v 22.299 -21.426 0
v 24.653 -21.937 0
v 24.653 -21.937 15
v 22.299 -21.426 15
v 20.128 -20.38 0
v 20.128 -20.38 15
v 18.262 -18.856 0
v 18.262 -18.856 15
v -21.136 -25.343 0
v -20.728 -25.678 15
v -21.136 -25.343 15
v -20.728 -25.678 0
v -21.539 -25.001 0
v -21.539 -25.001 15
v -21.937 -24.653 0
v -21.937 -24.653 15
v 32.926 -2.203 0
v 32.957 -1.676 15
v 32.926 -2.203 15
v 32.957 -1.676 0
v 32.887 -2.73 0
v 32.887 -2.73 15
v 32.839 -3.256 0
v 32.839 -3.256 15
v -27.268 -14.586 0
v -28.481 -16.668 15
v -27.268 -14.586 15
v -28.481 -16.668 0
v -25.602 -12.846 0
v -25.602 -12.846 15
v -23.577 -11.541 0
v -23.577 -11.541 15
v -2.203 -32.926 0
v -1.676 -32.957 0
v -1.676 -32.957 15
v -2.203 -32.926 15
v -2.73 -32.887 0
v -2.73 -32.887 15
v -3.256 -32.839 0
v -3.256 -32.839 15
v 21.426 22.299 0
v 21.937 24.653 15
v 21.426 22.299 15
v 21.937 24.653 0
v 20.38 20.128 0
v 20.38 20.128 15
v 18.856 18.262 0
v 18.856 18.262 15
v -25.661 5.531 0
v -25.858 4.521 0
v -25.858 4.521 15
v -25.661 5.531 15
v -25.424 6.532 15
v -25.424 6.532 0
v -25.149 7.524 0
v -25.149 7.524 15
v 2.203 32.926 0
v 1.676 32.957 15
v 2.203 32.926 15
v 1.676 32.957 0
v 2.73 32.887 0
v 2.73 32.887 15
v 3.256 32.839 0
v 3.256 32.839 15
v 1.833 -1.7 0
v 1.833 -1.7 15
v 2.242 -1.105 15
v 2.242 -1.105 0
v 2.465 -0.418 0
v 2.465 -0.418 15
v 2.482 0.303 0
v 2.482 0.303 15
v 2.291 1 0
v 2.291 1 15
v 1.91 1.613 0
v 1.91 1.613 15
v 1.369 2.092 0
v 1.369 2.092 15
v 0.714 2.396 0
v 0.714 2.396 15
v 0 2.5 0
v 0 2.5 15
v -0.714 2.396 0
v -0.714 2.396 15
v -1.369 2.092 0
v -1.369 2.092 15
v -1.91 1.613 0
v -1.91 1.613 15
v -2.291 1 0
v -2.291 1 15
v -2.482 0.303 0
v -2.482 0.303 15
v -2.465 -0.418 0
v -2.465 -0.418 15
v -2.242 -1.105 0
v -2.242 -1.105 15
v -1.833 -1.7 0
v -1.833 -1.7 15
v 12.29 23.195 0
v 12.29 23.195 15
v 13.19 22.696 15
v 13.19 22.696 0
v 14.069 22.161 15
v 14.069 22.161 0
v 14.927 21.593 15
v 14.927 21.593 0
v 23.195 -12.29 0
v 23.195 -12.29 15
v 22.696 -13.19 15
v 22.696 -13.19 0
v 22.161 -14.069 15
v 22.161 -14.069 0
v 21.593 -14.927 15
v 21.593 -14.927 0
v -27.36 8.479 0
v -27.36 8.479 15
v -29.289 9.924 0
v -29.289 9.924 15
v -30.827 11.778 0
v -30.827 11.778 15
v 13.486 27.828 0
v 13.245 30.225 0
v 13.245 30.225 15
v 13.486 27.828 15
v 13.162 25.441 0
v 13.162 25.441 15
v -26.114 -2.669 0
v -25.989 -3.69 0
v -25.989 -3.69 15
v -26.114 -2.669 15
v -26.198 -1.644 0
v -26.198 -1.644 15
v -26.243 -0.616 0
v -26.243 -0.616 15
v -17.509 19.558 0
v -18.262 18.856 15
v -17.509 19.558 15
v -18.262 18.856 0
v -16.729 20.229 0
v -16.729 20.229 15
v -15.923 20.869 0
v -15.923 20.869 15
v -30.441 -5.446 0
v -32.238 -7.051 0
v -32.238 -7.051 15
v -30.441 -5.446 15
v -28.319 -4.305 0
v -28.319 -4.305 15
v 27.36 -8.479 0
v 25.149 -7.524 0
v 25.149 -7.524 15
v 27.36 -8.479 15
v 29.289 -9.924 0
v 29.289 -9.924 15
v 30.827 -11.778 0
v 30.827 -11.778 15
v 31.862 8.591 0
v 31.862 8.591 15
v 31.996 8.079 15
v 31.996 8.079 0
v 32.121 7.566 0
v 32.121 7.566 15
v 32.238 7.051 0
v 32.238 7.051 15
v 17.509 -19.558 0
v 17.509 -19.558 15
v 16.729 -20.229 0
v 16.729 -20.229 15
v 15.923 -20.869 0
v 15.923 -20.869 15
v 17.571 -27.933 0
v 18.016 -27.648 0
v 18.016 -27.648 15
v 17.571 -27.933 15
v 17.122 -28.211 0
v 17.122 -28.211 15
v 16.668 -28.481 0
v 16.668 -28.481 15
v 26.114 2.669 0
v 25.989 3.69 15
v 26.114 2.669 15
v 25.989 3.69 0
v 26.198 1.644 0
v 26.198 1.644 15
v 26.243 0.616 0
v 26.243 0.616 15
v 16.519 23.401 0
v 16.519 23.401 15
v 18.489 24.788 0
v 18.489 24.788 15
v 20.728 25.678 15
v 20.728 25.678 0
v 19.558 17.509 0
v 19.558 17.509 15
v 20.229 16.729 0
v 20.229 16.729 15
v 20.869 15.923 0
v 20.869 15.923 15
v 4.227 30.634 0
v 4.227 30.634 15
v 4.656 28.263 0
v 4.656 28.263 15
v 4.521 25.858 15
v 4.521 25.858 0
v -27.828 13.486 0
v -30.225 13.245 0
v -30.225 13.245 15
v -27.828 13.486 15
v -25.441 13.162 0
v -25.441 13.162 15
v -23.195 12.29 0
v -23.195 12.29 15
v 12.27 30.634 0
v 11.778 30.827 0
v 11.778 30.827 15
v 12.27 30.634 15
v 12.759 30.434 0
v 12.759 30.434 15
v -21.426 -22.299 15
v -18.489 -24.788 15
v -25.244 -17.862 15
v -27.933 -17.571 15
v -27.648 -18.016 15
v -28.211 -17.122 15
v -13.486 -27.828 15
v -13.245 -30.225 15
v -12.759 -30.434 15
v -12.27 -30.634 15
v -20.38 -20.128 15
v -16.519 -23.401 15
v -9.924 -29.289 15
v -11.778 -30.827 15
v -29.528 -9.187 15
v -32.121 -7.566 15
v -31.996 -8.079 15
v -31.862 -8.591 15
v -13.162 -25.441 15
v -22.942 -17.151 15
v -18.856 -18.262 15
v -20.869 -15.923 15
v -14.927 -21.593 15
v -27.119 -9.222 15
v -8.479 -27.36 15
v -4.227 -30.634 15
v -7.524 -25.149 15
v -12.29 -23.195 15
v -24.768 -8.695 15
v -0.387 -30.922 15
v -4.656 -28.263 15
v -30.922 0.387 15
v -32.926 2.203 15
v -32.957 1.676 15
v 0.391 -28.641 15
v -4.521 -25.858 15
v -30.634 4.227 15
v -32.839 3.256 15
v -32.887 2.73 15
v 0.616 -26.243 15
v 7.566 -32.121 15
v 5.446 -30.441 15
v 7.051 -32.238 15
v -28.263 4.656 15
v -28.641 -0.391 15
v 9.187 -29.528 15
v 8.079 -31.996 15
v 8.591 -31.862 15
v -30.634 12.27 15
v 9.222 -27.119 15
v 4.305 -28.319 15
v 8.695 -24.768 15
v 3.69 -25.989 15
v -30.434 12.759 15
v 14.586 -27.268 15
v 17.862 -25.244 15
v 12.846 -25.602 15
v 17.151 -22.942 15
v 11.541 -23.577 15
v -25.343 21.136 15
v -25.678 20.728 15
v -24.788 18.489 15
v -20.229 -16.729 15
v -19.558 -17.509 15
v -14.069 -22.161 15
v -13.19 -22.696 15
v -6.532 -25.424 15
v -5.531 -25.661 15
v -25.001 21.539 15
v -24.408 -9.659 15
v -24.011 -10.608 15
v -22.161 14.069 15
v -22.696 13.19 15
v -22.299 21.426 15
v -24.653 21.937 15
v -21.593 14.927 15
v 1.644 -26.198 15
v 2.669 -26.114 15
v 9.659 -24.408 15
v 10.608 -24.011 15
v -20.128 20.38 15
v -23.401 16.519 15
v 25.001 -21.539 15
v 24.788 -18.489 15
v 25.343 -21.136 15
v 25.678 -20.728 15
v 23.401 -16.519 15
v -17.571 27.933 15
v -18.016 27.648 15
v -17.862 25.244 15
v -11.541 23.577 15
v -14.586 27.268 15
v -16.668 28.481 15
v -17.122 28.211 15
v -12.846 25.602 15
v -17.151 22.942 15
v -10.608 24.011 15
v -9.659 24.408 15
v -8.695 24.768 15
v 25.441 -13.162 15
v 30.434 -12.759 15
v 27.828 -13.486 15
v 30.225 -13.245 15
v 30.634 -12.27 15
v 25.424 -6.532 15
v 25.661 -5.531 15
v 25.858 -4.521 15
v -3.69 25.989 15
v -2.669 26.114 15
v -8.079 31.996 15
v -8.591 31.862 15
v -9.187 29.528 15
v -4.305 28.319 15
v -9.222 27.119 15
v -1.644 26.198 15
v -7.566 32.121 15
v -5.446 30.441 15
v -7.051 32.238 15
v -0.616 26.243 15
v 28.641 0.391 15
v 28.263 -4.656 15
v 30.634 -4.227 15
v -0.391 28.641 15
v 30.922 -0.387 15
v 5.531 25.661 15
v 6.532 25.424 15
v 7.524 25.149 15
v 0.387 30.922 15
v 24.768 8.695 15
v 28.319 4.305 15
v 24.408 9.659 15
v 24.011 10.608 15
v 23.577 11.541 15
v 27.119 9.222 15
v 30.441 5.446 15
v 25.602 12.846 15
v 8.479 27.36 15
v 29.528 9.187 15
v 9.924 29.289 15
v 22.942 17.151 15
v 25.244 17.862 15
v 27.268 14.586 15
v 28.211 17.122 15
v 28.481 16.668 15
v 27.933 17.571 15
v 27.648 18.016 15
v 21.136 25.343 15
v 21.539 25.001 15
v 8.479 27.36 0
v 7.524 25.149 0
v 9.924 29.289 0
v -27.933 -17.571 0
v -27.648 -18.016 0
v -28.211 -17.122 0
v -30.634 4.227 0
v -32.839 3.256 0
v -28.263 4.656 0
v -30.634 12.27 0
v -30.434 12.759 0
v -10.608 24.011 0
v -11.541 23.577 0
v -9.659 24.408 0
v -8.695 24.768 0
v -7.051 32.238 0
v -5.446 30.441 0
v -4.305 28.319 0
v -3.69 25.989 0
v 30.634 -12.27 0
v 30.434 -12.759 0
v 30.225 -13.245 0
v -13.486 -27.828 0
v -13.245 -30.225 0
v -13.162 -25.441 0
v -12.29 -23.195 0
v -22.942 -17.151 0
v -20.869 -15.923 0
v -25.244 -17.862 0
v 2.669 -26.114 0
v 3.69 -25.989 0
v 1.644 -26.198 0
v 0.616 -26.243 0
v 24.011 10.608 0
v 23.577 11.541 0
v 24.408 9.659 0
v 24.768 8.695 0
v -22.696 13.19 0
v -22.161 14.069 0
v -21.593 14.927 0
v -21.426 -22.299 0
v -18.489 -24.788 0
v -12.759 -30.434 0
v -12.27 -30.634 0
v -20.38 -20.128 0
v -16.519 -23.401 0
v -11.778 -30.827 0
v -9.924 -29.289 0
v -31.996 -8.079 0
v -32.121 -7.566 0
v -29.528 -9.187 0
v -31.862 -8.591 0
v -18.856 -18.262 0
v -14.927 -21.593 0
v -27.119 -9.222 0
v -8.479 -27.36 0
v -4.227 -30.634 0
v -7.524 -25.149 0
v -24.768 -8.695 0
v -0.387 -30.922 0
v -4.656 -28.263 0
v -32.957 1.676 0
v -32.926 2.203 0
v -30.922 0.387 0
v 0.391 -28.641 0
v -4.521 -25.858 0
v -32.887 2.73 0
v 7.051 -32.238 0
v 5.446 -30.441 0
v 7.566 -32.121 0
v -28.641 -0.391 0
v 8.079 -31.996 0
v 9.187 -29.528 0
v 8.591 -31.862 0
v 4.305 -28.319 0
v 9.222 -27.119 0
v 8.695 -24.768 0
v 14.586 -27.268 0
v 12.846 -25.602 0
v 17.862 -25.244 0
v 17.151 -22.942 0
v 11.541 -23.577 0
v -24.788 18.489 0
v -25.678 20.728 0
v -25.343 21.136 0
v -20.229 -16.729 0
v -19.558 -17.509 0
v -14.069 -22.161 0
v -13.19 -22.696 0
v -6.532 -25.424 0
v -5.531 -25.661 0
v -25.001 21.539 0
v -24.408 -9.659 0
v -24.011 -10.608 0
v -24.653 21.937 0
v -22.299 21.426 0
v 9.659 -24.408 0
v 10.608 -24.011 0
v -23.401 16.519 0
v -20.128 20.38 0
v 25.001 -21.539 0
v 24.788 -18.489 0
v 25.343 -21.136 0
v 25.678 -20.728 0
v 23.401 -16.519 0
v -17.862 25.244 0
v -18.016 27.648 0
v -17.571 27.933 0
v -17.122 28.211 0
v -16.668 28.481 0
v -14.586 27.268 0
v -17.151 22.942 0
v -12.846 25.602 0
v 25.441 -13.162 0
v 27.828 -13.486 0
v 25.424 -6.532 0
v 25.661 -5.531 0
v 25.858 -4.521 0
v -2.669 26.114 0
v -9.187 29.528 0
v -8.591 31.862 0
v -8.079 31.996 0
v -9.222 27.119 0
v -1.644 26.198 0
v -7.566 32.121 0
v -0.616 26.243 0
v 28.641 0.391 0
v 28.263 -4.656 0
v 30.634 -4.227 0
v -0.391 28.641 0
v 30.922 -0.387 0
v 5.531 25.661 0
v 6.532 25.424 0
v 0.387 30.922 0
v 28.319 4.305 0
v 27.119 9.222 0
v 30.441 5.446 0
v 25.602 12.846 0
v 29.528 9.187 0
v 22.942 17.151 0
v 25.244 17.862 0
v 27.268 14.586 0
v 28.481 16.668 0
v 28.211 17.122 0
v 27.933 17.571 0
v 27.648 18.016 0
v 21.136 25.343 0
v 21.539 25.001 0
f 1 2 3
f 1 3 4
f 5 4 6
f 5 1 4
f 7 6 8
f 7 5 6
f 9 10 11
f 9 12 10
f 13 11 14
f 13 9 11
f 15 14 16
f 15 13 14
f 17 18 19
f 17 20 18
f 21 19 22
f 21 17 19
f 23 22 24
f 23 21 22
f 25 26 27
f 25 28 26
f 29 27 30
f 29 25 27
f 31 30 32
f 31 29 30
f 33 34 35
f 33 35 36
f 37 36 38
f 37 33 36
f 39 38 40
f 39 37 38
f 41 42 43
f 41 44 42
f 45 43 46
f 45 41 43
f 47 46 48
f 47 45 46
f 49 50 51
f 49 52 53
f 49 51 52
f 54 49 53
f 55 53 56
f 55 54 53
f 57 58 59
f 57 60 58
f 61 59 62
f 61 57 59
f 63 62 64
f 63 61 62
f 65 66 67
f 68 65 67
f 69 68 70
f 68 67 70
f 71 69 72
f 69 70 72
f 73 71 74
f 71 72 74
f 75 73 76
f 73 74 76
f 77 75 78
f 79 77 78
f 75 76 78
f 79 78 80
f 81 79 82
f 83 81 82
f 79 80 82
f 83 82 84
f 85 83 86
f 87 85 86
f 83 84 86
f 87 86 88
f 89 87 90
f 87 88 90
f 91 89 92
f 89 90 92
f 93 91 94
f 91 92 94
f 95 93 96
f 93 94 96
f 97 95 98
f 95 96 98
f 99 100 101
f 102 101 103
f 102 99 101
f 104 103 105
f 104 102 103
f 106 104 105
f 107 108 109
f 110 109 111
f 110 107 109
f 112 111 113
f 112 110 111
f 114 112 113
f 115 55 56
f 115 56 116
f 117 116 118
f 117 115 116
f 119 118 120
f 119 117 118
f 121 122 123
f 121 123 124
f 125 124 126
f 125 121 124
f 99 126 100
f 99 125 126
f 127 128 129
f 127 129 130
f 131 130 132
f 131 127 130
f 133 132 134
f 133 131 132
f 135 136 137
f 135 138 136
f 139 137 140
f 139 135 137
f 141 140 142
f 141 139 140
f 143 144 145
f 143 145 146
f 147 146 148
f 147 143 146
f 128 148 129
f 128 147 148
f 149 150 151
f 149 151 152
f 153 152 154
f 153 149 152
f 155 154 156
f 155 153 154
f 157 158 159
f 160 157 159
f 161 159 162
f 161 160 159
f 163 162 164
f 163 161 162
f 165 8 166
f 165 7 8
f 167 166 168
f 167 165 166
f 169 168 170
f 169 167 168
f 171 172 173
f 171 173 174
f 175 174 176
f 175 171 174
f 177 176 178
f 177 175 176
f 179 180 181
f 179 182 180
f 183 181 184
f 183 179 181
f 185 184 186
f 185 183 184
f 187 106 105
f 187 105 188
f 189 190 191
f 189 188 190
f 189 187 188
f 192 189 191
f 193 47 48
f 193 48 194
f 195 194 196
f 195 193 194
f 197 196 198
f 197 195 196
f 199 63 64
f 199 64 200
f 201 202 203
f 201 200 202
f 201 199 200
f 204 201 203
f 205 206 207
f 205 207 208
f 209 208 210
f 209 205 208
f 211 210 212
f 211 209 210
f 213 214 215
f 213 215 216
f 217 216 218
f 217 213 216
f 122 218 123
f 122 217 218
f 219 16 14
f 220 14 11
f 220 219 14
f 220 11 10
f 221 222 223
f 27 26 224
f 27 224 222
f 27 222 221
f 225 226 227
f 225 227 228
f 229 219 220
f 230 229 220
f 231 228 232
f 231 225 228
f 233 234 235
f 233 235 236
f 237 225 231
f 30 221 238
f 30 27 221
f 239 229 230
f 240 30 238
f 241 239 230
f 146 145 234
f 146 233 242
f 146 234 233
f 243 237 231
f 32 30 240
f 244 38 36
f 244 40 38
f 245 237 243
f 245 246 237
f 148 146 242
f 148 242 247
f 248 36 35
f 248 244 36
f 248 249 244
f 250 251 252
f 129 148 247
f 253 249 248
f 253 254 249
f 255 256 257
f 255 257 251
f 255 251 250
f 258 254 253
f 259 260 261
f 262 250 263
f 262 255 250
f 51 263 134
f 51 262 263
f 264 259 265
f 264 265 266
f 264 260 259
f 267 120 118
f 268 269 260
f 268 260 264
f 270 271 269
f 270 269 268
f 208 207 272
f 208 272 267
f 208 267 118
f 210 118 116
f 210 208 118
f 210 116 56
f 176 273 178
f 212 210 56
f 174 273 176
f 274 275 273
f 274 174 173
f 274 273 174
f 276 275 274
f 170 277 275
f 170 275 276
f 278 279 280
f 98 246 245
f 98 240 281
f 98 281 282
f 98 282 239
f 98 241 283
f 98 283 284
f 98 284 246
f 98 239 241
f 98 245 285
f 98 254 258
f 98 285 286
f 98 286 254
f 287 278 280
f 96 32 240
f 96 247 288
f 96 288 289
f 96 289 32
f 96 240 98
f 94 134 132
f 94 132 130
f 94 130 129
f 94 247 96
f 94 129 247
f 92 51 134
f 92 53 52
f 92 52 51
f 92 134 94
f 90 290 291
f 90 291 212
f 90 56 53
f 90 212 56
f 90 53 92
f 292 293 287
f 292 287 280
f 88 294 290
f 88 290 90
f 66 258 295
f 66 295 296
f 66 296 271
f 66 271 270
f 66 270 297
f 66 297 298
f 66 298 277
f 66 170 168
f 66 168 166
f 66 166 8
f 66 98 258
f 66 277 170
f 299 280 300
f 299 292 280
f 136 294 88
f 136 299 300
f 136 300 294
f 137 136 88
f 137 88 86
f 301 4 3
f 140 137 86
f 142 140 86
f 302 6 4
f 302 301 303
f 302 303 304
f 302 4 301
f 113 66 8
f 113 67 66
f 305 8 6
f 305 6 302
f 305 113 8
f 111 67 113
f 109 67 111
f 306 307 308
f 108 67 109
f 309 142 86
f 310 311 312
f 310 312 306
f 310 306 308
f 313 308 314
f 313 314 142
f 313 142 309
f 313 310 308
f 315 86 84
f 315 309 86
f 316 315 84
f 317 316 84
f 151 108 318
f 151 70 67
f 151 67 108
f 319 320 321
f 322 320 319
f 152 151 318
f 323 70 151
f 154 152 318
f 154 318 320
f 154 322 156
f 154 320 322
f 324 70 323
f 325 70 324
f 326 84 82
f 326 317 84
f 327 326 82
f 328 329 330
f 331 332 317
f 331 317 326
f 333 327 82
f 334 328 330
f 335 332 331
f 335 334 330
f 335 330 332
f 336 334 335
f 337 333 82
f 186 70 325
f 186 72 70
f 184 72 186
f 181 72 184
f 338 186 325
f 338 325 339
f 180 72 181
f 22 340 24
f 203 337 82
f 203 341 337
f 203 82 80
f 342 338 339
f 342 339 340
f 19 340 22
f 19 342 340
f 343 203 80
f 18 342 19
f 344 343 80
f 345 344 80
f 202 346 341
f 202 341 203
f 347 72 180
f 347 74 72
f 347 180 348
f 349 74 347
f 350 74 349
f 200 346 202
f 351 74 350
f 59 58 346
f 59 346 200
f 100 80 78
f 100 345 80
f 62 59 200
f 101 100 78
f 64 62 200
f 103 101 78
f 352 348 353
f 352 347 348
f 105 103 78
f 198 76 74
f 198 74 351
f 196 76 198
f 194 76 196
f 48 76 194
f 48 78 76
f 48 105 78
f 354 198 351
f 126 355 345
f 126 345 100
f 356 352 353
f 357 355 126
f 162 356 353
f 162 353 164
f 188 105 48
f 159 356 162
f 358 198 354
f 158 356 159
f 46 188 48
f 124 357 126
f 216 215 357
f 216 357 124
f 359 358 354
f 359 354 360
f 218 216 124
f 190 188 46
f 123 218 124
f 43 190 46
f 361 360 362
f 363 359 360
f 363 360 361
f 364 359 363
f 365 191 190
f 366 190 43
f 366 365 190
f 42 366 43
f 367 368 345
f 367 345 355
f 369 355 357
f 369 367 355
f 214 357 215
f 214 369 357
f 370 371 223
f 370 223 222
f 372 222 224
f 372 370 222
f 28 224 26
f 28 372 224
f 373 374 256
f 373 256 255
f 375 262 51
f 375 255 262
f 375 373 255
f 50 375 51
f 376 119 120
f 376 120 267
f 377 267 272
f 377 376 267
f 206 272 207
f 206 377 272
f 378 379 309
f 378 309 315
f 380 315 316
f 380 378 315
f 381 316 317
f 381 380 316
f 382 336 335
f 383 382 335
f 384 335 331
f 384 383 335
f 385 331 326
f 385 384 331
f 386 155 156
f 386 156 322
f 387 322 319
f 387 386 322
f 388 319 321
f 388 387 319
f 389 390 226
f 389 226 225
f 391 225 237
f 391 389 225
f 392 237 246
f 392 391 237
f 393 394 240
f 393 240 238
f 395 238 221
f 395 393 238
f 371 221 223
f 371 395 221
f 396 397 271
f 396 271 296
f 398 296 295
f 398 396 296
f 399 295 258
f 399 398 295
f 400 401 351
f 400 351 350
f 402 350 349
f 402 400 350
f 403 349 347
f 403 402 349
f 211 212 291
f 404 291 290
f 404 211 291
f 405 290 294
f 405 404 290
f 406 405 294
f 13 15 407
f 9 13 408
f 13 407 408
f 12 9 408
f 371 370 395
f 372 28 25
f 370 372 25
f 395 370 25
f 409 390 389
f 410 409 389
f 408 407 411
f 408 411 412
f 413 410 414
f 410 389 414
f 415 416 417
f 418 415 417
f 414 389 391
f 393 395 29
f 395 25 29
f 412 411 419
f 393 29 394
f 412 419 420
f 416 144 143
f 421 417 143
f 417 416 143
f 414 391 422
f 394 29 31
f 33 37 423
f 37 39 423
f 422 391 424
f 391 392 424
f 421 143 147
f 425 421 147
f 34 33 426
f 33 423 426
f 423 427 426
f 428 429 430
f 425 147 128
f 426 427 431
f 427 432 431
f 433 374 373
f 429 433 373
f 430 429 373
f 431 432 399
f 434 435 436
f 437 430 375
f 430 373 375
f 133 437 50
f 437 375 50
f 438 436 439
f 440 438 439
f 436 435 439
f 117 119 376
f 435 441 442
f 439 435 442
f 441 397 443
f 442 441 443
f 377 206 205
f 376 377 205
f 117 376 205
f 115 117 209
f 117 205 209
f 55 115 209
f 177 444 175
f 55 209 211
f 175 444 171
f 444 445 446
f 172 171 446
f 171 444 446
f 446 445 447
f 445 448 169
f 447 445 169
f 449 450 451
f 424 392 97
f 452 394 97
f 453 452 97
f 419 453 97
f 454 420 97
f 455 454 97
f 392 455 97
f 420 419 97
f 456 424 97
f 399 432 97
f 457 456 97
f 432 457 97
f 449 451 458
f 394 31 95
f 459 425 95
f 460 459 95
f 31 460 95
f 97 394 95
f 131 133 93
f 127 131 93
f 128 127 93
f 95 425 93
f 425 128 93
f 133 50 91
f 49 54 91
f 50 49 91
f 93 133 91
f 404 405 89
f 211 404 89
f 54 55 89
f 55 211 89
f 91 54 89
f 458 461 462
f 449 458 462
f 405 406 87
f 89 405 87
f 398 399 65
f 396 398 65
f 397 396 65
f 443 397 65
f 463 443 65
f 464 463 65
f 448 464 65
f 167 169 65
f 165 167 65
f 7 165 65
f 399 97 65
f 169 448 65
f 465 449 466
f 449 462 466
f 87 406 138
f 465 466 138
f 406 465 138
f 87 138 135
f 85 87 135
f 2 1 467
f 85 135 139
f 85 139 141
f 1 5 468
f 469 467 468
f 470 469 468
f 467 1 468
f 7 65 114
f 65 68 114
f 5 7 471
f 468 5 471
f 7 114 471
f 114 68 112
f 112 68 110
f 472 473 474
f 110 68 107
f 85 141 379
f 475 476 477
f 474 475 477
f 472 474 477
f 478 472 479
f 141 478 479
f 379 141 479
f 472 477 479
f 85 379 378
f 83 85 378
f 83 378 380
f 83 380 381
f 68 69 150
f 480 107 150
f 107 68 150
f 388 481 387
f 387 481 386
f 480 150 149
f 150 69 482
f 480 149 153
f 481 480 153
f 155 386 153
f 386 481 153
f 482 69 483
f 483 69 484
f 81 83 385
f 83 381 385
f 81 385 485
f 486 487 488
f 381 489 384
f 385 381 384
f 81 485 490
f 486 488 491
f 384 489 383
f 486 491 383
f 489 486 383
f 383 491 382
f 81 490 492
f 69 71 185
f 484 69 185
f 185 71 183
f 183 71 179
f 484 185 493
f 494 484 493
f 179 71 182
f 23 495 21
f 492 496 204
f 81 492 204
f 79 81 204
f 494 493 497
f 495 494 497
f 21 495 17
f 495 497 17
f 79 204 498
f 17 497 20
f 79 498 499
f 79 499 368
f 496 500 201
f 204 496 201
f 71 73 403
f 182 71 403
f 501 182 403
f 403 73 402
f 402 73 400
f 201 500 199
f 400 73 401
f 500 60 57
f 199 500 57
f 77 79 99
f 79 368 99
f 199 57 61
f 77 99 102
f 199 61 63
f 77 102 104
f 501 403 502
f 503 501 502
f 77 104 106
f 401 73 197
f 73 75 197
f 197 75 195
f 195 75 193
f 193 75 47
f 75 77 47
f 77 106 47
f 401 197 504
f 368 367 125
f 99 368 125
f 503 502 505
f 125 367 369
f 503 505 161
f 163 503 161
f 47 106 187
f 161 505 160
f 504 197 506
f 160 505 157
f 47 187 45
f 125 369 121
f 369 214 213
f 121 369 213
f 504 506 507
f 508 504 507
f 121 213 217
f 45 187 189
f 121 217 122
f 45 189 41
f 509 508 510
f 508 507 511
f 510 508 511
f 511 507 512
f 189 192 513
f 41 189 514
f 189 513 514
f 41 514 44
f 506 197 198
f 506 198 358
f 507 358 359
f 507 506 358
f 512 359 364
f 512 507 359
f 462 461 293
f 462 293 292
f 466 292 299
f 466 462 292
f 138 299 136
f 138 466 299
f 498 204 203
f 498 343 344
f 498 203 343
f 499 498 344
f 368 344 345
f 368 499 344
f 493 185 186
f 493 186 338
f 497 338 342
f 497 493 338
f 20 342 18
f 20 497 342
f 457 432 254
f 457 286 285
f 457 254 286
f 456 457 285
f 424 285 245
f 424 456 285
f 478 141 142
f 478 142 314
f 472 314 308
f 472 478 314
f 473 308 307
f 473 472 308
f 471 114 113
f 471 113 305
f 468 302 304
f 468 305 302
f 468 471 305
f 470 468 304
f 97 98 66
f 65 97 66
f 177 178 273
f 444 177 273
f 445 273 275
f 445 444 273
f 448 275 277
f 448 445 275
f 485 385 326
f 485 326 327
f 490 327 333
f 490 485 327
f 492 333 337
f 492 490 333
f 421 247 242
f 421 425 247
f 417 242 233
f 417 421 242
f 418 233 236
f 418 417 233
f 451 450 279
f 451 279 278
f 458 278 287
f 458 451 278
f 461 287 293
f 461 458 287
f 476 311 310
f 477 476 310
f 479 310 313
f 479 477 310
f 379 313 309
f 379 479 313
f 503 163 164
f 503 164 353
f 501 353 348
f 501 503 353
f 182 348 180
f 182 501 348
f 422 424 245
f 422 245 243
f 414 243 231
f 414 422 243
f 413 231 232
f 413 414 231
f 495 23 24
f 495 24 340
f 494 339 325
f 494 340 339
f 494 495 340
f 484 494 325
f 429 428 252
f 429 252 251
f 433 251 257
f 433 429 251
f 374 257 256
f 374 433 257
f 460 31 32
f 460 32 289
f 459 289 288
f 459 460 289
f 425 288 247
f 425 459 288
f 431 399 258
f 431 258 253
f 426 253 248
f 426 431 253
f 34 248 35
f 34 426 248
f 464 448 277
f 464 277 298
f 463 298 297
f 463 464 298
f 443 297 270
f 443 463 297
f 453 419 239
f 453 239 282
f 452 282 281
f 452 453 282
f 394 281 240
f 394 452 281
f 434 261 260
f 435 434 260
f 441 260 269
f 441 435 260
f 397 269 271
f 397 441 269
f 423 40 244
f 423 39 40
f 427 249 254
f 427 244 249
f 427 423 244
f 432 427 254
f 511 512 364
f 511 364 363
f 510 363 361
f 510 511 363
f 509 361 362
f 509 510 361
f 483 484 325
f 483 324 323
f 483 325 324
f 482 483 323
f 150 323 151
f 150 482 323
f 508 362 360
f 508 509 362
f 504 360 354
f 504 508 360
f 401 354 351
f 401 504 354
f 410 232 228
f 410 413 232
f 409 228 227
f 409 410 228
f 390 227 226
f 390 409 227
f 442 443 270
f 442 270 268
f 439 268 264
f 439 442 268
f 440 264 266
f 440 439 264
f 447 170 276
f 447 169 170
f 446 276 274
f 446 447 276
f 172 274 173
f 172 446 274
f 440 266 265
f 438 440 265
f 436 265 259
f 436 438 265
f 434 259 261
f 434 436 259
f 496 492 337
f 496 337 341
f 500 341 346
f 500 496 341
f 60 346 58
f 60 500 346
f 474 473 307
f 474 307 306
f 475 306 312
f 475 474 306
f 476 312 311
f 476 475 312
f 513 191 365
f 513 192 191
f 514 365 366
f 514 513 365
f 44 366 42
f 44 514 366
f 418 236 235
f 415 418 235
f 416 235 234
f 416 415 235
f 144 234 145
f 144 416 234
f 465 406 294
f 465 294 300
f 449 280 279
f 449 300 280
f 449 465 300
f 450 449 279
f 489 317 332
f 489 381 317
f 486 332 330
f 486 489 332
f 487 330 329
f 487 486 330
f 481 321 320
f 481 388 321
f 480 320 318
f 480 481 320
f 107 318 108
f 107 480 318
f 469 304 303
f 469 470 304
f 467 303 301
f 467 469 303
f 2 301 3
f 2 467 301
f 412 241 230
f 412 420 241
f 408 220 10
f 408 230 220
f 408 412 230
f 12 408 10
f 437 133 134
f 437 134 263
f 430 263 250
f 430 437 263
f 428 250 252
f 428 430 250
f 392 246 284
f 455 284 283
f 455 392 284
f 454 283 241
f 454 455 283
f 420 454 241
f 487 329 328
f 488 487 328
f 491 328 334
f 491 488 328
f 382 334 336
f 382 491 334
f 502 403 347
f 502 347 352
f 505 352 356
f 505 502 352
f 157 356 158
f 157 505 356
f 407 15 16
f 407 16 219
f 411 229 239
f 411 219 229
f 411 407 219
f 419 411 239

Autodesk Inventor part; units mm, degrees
ref_plane "YZ Plane" through (0, 0, 0) normal (1, 0, 0) x (0, 1, 0)
ref_plane "XZ Plane" through (0, 0, 0) normal (0, 1, 0) x (-1, 0, 0)
ref_plane "XY Plane" through (0, 0, 0) normal (0, 0, 1) x (1, 0, 0)
sketch "Sketch1" plane through (0, 0, 0) normal (0, 0, 1) x (1, 0, 0)
  arc A0 (32.8389, -3.2565) -> (32.9574, -1.6756) centre (0, 0) ccw
  circle A1 centre (0, 0) radius 26.25
  line L0 (0, 0) -> (42.2346, 0) construction
  line L1 (0, 0) -> (37.3319, 0) construction
  arc A2 (32.9574, -1.6756) -> (26.2428, 0.6158) centre (26.4907, -9.6418) ccw
  line L2 (0, 0) -> (41.4252, 0) construction
  arc A3 (25.8577, -4.5212) -> (32.8389, -3.2565) centre (27.632, 5.5848) ccw
  arc A4 (32.238, 7.0507) -> (31.8622, 8.5908) centre (0, 0) ccw
  arc A5 (31.8622, 8.5908) -> (24.7681, 8.6951) centre (28.1736, -0.9838) ccw
  arc A6 (25.9893, 3.6905) -> (32.238, 7.0507) centre (24.5538, 13.8502) ccw
  arc A7 (28.4814, 16.6677) -> (27.648, 18.0163) centre (0, 0) ccw
  arc A8 (27.648, 18.0163) -> (20.8689, 15.9233) centre (27.0987, 7.7704) ccw
  arc A9 (23.5768, 11.541) -> (28.4814, 16.6677) centre (19.0721, 20.7599) ccw
  arc A10 (21.9368, 24.6531) -> (20.7275, 25.6782) centre (0, 0) ccw
  arc A11 (20.7275, 25.6782) -> (14.9269, 21.5928) centre (23.3712, 15.7641) ccw
  arc A12 (18.8565, 18.2618) -> (21.9368, 24.6531) centre (11.7235, 25.6375) ccw
  arc A13 (13.2449, 30.2254) -> (11.778, 30.8266) centre (0, 0) ccw
  arc A14 (11.778, 30.8266) -> (7.5238, 25.1487) centre (17.356, 22.2146) ccw
  arc A15 (12.2904, 23.195) -> (13.2449, 30.2254) centre (3.2273, 28.0054) ccw
  arc A16 (3.2565, 32.8389) -> (1.6756, 32.9574) centre (0, 0) ccw
  arc A17 (1.6756, 32.9574) -> (-0.6158, 26.2428) centre (9.6418, 26.4907) ccw
  arc A18 (4.5212, 25.8577) -> (3.2565, 32.8389) centre (-5.5848, 27.632) ccw
  arc A19 (-7.0507, 32.238) -> (-8.5908, 31.8622) centre (0, 0) ccw
  arc A20 (-8.5908, 31.8622) -> (-8.6951, 24.7681) centre (0.9838, 28.1736) ccw
  arc A21 (-3.6905, 25.9893) -> (-7.0507, 32.238) centre (-13.8502, 24.5538) ccw
  arc A22 (-16.6677, 28.4814) -> (-18.0163, 27.648) centre (0, 0) ccw
  arc A23 (-18.0163, 27.648) -> (-15.9233, 20.8689) centre (-7.7704, 27.0987) ccw
  arc A24 (-11.541, 23.5768) -> (-16.6677, 28.4814) centre (-20.7599, 19.0721) ccw
  arc A25 (-24.6531, 21.9368) -> (-25.6782, 20.7275) centre (0, 0) ccw
  arc A26 (-25.6782, 20.7275) -> (-21.5928, 14.9269) centre (-15.7641, 23.3712) ccw
  arc A27 (-18.2618, 18.8565) -> (-24.6531, 21.9368) centre (-25.6375, 11.7235) ccw
  arc A28 (-30.2254, 13.2449) -> (-30.8266, 11.778) centre (0, 0) ccw
  arc A29 (-30.8266, 11.778) -> (-25.1487, 7.5238) centre (-22.2146, 17.356) ccw
  arc A30 (-23.195, 12.2904) -> (-30.2254, 13.2449) centre (-28.0054, 3.2273) ccw
  arc A31 (-32.8389, 3.2565) -> (-32.9574, 1.6756) centre (0, 0) ccw
  arc A32 (-32.9574, 1.6756) -> (-26.2428, -0.6158) centre (-26.4907, 9.6418) ccw
  arc A33 (-25.8577, 4.5212) -> (-32.8389, 3.2565) centre (-27.632, -5.5848) ccw
  arc A34 (-32.238, -7.0507) -> (-31.8622, -8.5908) centre (0, 0) ccw
  arc A35 (-31.8622, -8.5908) -> (-24.7681, -8.6951) centre (-28.1736, 0.9838) ccw
  arc A36 (-25.9893, -3.6905) -> (-32.238, -7.0507) centre (-24.5538, -13.8502) ccw
  arc A37 (-28.4814, -16.6677) -> (-27.648, -18.0163) centre (0, 0) ccw
  arc A38 (-27.648, -18.0163) -> (-20.8689, -15.9233) centre (-27.0987, -7.7704) ccw
  arc A39 (-23.5768, -11.541) -> (-28.4814, -16.6677) centre (-19.0721, -20.7599) ccw
  arc A40 (-21.9368, -24.6531) -> (-20.7275, -25.6782) centre (0, 0) ccw
  arc A41 (-20.7275, -25.6782) -> (-14.9269, -21.5928) centre (-23.3712, -15.7641) ccw
  arc A42 (-18.8565, -18.2618) -> (-21.9368, -24.6531) centre (-11.7235, -25.6375) ccw
  arc A43 (-13.2449, -30.2254) -> (-11.778, -30.8266) centre (0, 0) ccw
  arc A44 (-11.778, -30.8266) -> (-7.5238, -25.1487) centre (-17.356, -22.2146) ccw
  arc A45 (-12.2904, -23.195) -> (-13.2449, -30.2254) centre (-3.2273, -28.0054) ccw
  arc A46 (-3.2565, -32.8389) -> (-1.6756, -32.9574) centre (0, 0) ccw
  arc A47 (-1.6756, -32.9574) -> (0.6158, -26.2428) centre (-9.6418, -26.4907) ccw
  arc A48 (-4.5212, -25.8577) -> (-3.2565, -32.8389) centre (5.5848, -27.632) ccw
  arc A49 (7.0507, -32.238) -> (8.5908, -31.8622) centre (0, 0) ccw
  arc A50 (8.5908, -31.8622) -> (8.6951, -24.7681) centre (-0.9838, -28.1736) ccw
  arc A51 (3.6905, -25.9893) -> (7.0507, -32.238) centre (13.8502, -24.5538) ccw
  arc A52 (16.6677, -28.4814) -> (18.0163, -27.648) centre (0, 0) ccw
  arc A53 (18.0163, -27.648) -> (15.9233, -20.8689) centre (7.7704, -27.0987) ccw
  arc A54 (11.541, -23.5768) -> (16.6677, -28.4814) centre (20.7599, -19.0721) ccw
  arc A55 (24.6531, -21.9368) -> (25.6782, -20.7275) centre (0, 0) ccw
  arc A56 (25.6782, -20.7275) -> (21.5928, -14.9269) centre (15.7641, -23.3712) ccw
  arc A57 (18.2618, -18.8565) -> (24.6531, -21.9368) centre (25.6375, -11.7235) ccw
  arc A58 (30.2254, -13.2449) -> (30.8266, -11.778) centre (0, 0) ccw
  arc A59 (30.8266, -11.778) -> (25.1487, -7.5238) centre (22.2146, -17.356) ccw
  arc A60 (23.195, -12.2904) -> (30.2254, -13.2449) centre (28.0054, -3.2273) ccw
  point P0 (35.5048, 11.5362)
  point P1 (30.2022, 21.9432)
  point P2 (21.9432, 30.2022)
  point P3 (11.5362, 35.5048)
  point P4 (0, 37.3319)
  point P5 (-11.5362, 35.5048)
  point P6 (-21.9432, 30.2022)
  point P7 (-30.2022, 21.9432)
  point P8 (-35.5048, 11.5362)
  point P9 (-37.3319, 0)
  point P10 (-35.5048, -11.5362)
  point P11 (-30.2022, -21.9432)
  point P12 (-21.9432, -30.2022)
  point P13 (-11.5362, -35.5048)
  point P14 (0, -37.3319)
  point P15 (11.5362, -35.5048)
  point P16 (21.9432, -30.2022)
  point P17 (30.2022, -21.9432)
  point P18 (35.5048, -11.5362)
  point P19 (-14.9269, -21.5928)
  point P20 (-12.2904, -23.195)
  point P21 (-7.5238, -25.1487)
  point P22 (0.6158, -26.2428)
  point P23 (3.6905, -25.9893)
  point P24 (18.2618, -18.8565)
  point P25 (21.5928, -14.9269)
  point P26 (23.195, -12.2904)
  point P27 (25.1487, -7.5238)
  point P28 (25.9893, 3.6905)
  point P29 (20.8689, 15.9233)
  point P30 (18.8565, 18.2618)
  point P31 (14.9269, 21.5928)
  point P32 (7.5238, 25.1487)
  point P33 (-0.6158, 26.2428)
  point P34 (-3.6905, 25.9893)
  point P35 (-15.9233, 20.8689)
  point P36 (-18.2618, 18.8565)
  point P37 (-21.5928, 14.9269)
  point P38 (-23.195, 12.2904)
  point P39 (-25.1487, 7.5238)
  point P40 (-26.2428, -0.6158)
  point P41 (-24.7681, -8.6951)
  point P42 (-20.8689, -15.9233)
  point P43 (-18.8565, -18.2618)
  dimension "d2" = 52.5
  dimension "d1" = 66
  dimension "d13" = 360
extrude "Extrusion1" add sketch "Sketch1" along normal blind 15
sketch "Sketch2" plane through (0, 0, 15) normal (0, 0, 1) x (1, 0, 0)
  circle A0 centre (0, 0) radius 2.5
  line L0 (0, 2.5) -> (0, -1.7)
  line L1 (0, -1.7) -> (-3.9911, -1.7)
  line L2 (-3.9911, -1.7) -> (4.1911, -1.7)
  point P0 (1.833, -1.7)
  point P1 (-1.833, -1.7)
  dimension "d17" = 5
  dimension "d22" = 4.2
extrude "Extrusion2" cut sketch "Sketch2" against normal blind 15 contours A0 L2 L0 | L0 L1 A0
properties part number "ENGRANE MOTRIZ DE CAJA"
